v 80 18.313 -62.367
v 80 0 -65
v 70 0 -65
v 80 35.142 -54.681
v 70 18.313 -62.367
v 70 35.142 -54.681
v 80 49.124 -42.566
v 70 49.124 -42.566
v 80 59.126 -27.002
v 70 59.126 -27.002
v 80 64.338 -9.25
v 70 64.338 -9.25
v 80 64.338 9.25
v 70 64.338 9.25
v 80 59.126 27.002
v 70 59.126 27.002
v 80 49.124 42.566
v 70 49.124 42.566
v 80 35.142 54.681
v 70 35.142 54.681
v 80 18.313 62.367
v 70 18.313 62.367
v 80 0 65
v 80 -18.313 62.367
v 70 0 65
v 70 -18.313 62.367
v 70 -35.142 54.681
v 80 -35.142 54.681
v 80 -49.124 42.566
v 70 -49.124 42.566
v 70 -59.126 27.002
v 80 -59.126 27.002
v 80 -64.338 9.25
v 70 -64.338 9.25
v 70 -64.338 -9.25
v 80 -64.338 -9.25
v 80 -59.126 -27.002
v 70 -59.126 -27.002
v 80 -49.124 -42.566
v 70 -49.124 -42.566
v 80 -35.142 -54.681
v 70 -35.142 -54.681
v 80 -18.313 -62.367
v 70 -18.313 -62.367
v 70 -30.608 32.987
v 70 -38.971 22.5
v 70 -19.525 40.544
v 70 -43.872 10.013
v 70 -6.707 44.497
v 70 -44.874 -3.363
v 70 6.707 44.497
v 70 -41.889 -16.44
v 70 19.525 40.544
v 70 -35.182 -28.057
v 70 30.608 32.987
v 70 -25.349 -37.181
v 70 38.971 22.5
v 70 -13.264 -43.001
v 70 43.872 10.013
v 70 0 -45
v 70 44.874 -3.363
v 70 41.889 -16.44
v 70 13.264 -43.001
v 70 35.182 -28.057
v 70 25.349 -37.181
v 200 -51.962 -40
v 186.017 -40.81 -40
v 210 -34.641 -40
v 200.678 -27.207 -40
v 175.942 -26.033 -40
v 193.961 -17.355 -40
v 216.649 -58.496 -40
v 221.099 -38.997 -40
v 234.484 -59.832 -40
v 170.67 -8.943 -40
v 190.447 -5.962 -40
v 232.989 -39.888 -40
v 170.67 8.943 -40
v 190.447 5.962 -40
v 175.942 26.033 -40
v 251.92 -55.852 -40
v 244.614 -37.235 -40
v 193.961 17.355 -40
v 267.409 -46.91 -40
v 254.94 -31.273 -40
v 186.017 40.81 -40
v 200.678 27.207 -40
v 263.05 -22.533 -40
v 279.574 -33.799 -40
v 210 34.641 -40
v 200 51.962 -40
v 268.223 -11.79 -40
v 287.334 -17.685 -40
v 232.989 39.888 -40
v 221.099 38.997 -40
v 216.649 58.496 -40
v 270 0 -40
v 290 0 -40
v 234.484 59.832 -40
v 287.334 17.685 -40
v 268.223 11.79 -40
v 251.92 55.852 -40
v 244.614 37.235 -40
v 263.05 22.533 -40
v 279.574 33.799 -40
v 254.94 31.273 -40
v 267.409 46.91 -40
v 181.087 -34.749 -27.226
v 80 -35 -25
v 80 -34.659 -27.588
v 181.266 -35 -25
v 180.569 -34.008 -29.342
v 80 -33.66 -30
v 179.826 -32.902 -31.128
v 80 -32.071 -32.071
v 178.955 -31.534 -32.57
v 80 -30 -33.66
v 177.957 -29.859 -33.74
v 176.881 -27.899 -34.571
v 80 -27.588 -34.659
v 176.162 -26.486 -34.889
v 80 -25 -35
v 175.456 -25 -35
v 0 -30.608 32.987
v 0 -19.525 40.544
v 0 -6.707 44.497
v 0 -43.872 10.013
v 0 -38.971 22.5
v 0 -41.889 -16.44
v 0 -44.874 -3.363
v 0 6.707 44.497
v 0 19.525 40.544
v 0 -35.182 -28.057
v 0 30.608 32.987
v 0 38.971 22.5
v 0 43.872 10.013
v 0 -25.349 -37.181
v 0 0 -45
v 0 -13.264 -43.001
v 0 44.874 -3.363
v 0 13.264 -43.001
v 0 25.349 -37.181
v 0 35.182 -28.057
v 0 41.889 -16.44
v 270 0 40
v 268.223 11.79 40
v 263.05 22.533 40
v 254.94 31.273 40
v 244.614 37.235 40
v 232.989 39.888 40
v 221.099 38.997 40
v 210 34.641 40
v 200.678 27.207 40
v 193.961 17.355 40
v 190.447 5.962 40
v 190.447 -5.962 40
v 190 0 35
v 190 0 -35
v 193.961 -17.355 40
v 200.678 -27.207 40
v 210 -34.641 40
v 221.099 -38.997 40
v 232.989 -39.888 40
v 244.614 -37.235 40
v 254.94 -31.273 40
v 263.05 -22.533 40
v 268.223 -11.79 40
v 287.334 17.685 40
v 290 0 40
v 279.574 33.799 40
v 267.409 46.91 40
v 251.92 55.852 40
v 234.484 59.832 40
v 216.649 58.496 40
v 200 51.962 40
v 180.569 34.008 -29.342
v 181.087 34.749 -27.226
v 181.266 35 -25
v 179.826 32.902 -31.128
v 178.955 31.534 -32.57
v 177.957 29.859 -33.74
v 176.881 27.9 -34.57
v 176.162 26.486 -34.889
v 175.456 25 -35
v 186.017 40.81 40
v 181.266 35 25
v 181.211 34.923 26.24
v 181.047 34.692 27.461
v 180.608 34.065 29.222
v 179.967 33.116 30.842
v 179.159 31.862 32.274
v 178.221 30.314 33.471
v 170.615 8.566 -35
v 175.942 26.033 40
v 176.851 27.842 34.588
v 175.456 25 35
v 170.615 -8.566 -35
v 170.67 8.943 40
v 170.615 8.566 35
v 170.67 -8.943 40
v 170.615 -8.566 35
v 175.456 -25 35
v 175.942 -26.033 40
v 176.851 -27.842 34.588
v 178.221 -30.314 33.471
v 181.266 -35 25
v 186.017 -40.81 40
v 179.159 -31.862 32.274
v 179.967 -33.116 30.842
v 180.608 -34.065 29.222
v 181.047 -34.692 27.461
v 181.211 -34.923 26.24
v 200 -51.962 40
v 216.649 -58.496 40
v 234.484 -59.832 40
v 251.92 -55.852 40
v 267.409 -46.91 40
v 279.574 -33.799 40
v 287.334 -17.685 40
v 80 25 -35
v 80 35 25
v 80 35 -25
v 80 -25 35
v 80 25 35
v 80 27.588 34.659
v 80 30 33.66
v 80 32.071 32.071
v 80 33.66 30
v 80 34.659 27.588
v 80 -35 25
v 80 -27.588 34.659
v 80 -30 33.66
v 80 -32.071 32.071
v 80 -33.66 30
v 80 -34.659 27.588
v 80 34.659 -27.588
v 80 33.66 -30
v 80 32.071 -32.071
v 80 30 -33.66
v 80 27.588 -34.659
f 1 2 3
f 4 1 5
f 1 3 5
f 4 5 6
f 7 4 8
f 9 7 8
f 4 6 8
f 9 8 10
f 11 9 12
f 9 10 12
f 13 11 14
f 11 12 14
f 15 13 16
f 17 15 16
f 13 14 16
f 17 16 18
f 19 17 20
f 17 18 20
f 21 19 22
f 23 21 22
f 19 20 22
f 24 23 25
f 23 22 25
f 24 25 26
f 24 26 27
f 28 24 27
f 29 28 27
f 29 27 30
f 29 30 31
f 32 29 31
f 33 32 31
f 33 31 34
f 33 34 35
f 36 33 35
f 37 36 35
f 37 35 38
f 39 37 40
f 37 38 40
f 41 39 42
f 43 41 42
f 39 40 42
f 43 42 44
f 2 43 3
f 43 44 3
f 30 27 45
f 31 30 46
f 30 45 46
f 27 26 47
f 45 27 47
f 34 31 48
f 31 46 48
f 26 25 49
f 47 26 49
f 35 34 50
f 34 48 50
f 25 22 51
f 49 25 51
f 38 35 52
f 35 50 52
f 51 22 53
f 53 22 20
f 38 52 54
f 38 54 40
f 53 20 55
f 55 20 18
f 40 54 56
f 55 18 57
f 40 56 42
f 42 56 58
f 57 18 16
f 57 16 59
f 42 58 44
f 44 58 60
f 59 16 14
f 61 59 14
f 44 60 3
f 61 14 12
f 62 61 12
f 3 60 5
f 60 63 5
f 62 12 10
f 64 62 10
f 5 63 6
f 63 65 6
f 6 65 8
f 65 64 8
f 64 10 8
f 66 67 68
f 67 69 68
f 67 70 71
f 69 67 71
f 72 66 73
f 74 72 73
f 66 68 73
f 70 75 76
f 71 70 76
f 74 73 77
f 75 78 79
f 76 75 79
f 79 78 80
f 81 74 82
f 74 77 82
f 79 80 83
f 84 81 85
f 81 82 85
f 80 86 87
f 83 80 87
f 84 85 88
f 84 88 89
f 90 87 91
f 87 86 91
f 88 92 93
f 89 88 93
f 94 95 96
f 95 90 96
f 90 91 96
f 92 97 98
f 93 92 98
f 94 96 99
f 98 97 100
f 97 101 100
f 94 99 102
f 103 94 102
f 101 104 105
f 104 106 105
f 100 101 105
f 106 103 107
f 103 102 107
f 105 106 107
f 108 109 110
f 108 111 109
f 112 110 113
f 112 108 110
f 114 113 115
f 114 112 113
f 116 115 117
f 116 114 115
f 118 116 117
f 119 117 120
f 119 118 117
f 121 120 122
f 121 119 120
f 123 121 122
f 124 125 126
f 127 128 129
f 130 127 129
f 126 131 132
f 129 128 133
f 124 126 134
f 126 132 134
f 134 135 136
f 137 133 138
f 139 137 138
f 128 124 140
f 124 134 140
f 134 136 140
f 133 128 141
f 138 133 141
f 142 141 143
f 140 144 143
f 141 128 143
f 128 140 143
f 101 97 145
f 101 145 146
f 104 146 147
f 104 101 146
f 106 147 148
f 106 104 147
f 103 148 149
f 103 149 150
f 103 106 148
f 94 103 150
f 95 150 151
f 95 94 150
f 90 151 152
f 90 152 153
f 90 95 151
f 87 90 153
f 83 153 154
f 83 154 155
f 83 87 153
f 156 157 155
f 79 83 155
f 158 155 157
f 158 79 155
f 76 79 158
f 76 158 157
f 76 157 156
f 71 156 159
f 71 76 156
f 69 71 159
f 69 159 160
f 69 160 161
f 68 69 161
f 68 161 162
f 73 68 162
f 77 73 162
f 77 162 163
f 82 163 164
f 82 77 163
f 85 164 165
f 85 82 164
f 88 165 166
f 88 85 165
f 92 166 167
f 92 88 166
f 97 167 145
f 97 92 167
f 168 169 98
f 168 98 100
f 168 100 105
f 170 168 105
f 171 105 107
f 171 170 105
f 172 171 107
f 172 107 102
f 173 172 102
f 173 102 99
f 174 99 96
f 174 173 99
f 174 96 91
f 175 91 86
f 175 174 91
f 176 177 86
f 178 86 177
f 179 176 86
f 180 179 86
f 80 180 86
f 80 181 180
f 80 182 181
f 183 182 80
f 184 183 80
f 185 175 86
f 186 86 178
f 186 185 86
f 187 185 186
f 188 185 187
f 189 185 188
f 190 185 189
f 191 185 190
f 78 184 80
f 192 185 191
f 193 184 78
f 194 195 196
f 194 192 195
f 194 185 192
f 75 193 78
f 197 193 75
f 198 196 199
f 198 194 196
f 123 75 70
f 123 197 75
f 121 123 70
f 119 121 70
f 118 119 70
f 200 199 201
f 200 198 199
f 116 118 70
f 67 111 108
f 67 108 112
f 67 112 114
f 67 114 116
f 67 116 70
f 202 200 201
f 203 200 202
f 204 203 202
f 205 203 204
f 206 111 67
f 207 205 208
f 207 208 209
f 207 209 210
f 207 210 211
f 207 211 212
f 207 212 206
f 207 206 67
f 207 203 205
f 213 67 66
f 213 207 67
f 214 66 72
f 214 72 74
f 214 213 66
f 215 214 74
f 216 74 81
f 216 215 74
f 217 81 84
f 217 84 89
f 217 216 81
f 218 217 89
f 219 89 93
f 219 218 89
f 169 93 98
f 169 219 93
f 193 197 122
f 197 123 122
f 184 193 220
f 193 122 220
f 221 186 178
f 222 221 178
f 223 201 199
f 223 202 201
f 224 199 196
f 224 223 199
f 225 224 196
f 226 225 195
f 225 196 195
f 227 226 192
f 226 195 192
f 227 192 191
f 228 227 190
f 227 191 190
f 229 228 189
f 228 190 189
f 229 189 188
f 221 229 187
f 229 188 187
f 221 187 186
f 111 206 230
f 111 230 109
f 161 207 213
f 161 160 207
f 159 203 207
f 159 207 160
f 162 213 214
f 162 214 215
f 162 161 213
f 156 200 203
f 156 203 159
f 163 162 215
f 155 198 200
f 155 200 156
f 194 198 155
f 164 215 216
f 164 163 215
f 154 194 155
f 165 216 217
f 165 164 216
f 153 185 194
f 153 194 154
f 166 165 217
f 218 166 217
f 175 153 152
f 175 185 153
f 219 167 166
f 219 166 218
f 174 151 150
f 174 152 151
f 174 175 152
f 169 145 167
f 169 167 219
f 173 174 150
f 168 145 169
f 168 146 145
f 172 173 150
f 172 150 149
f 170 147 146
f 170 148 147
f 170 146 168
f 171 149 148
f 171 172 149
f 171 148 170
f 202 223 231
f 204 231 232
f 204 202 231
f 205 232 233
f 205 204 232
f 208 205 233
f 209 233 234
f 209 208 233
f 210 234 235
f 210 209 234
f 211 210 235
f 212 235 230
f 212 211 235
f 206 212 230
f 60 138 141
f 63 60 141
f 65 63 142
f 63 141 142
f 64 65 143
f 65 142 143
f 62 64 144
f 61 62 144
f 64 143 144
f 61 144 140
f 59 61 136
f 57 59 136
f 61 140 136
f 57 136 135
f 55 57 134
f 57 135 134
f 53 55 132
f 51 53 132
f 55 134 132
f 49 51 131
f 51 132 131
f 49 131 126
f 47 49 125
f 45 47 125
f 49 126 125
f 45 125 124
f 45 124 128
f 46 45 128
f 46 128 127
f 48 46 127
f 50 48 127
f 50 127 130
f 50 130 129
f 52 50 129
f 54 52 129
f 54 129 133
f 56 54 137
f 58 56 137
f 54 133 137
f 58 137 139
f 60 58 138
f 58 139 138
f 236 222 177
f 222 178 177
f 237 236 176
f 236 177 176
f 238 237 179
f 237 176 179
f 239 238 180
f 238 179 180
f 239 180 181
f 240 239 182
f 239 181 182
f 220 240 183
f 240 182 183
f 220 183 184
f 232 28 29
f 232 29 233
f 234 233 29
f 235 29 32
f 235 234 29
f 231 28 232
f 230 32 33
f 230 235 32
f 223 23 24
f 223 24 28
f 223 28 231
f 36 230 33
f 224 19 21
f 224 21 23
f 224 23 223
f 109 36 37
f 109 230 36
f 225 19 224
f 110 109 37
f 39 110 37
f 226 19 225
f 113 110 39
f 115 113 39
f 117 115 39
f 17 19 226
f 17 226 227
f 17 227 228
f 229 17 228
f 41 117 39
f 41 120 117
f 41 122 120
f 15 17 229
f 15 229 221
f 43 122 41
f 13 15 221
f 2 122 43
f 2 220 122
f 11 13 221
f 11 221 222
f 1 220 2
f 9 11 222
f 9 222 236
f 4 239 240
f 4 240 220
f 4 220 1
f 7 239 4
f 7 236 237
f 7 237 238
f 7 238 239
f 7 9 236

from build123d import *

# Parameters (mm, degrees)
SKETCH1_R           = 45
BOSS_EXTRUDE1_DEPTH = 70
SKETCH2_R           = 65
BOSS_EXTRUDE2_DEPTH = 10
SKETCH3_R           = 60
SKETCH3_R_2         = 40
BOSS_EXTRUDE3_DEPTH = 40
SKETCH4_W           = 70
SKETCH4_H           = 70
BOSS_EXTRUDE4_DEPTH = 110
FILLET1_R           = 10


with BuildPart() as part:
    # Sketch1 → Boss-Extrude1 (new body)
    with BuildSketch(Plane(origin=(0, 0, 0), x_dir=(0, 0, -1), z_dir=(1, 0, 0))):
        Circle(SKETCH1_R)
    extrude(amount=BOSS_EXTRUDE1_DEPTH)

    # Sketch2 → Boss-Extrude2 (add)
    with BuildSketch(Plane(origin=(70, 0, 0), x_dir=(0, 0, -1), z_dir=(1, 0, 0))):
        Circle(SKETCH2_R)
    extrude(amount=BOSS_EXTRUDE2_DEPTH)



with BuildPart() as body_2:
    # Sketch3 → Boss-Extrude3 (new, symmetric)
    with BuildSketch(Plane.XY):
        with Locations((230, 0)):
            Circle(SKETCH3_R)
        with Locations((230, 0)):
            Circle(SKETCH3_R_2, mode=Mode.SUBTRACT)
    extrude(amount=BOSS_EXTRUDE3_DEPTH, both=True)


with BuildPart() as part_1:
    add(part.part)

    add(body_2.part)  # Boss-Extrude4 merges body 2
    # Sketch4 → Boss-Extrude4 (add)
    with BuildSketch(Plane(origin=(80, 0, 0), x_dir=(0, 0, -1), z_dir=(1, 0, 0))):
        Rectangle(SKETCH4_W, SKETCH4_H)
    extrude(amount=BOSS_EXTRUDE4_DEPTH)

    # Fillet1
    fillet1_edges = [part_1.edges().sort_by_distance(p)[0] for p in [
        (130.633014138, -35, -35),
        (130.633014138, -35, 35),
        (130.633014138, 35, 35),
        (130.633014138, 35, -35),
    ]]
    fillet(fillet1_edges, radius=FILLET1_R)


solid = part_1.part
